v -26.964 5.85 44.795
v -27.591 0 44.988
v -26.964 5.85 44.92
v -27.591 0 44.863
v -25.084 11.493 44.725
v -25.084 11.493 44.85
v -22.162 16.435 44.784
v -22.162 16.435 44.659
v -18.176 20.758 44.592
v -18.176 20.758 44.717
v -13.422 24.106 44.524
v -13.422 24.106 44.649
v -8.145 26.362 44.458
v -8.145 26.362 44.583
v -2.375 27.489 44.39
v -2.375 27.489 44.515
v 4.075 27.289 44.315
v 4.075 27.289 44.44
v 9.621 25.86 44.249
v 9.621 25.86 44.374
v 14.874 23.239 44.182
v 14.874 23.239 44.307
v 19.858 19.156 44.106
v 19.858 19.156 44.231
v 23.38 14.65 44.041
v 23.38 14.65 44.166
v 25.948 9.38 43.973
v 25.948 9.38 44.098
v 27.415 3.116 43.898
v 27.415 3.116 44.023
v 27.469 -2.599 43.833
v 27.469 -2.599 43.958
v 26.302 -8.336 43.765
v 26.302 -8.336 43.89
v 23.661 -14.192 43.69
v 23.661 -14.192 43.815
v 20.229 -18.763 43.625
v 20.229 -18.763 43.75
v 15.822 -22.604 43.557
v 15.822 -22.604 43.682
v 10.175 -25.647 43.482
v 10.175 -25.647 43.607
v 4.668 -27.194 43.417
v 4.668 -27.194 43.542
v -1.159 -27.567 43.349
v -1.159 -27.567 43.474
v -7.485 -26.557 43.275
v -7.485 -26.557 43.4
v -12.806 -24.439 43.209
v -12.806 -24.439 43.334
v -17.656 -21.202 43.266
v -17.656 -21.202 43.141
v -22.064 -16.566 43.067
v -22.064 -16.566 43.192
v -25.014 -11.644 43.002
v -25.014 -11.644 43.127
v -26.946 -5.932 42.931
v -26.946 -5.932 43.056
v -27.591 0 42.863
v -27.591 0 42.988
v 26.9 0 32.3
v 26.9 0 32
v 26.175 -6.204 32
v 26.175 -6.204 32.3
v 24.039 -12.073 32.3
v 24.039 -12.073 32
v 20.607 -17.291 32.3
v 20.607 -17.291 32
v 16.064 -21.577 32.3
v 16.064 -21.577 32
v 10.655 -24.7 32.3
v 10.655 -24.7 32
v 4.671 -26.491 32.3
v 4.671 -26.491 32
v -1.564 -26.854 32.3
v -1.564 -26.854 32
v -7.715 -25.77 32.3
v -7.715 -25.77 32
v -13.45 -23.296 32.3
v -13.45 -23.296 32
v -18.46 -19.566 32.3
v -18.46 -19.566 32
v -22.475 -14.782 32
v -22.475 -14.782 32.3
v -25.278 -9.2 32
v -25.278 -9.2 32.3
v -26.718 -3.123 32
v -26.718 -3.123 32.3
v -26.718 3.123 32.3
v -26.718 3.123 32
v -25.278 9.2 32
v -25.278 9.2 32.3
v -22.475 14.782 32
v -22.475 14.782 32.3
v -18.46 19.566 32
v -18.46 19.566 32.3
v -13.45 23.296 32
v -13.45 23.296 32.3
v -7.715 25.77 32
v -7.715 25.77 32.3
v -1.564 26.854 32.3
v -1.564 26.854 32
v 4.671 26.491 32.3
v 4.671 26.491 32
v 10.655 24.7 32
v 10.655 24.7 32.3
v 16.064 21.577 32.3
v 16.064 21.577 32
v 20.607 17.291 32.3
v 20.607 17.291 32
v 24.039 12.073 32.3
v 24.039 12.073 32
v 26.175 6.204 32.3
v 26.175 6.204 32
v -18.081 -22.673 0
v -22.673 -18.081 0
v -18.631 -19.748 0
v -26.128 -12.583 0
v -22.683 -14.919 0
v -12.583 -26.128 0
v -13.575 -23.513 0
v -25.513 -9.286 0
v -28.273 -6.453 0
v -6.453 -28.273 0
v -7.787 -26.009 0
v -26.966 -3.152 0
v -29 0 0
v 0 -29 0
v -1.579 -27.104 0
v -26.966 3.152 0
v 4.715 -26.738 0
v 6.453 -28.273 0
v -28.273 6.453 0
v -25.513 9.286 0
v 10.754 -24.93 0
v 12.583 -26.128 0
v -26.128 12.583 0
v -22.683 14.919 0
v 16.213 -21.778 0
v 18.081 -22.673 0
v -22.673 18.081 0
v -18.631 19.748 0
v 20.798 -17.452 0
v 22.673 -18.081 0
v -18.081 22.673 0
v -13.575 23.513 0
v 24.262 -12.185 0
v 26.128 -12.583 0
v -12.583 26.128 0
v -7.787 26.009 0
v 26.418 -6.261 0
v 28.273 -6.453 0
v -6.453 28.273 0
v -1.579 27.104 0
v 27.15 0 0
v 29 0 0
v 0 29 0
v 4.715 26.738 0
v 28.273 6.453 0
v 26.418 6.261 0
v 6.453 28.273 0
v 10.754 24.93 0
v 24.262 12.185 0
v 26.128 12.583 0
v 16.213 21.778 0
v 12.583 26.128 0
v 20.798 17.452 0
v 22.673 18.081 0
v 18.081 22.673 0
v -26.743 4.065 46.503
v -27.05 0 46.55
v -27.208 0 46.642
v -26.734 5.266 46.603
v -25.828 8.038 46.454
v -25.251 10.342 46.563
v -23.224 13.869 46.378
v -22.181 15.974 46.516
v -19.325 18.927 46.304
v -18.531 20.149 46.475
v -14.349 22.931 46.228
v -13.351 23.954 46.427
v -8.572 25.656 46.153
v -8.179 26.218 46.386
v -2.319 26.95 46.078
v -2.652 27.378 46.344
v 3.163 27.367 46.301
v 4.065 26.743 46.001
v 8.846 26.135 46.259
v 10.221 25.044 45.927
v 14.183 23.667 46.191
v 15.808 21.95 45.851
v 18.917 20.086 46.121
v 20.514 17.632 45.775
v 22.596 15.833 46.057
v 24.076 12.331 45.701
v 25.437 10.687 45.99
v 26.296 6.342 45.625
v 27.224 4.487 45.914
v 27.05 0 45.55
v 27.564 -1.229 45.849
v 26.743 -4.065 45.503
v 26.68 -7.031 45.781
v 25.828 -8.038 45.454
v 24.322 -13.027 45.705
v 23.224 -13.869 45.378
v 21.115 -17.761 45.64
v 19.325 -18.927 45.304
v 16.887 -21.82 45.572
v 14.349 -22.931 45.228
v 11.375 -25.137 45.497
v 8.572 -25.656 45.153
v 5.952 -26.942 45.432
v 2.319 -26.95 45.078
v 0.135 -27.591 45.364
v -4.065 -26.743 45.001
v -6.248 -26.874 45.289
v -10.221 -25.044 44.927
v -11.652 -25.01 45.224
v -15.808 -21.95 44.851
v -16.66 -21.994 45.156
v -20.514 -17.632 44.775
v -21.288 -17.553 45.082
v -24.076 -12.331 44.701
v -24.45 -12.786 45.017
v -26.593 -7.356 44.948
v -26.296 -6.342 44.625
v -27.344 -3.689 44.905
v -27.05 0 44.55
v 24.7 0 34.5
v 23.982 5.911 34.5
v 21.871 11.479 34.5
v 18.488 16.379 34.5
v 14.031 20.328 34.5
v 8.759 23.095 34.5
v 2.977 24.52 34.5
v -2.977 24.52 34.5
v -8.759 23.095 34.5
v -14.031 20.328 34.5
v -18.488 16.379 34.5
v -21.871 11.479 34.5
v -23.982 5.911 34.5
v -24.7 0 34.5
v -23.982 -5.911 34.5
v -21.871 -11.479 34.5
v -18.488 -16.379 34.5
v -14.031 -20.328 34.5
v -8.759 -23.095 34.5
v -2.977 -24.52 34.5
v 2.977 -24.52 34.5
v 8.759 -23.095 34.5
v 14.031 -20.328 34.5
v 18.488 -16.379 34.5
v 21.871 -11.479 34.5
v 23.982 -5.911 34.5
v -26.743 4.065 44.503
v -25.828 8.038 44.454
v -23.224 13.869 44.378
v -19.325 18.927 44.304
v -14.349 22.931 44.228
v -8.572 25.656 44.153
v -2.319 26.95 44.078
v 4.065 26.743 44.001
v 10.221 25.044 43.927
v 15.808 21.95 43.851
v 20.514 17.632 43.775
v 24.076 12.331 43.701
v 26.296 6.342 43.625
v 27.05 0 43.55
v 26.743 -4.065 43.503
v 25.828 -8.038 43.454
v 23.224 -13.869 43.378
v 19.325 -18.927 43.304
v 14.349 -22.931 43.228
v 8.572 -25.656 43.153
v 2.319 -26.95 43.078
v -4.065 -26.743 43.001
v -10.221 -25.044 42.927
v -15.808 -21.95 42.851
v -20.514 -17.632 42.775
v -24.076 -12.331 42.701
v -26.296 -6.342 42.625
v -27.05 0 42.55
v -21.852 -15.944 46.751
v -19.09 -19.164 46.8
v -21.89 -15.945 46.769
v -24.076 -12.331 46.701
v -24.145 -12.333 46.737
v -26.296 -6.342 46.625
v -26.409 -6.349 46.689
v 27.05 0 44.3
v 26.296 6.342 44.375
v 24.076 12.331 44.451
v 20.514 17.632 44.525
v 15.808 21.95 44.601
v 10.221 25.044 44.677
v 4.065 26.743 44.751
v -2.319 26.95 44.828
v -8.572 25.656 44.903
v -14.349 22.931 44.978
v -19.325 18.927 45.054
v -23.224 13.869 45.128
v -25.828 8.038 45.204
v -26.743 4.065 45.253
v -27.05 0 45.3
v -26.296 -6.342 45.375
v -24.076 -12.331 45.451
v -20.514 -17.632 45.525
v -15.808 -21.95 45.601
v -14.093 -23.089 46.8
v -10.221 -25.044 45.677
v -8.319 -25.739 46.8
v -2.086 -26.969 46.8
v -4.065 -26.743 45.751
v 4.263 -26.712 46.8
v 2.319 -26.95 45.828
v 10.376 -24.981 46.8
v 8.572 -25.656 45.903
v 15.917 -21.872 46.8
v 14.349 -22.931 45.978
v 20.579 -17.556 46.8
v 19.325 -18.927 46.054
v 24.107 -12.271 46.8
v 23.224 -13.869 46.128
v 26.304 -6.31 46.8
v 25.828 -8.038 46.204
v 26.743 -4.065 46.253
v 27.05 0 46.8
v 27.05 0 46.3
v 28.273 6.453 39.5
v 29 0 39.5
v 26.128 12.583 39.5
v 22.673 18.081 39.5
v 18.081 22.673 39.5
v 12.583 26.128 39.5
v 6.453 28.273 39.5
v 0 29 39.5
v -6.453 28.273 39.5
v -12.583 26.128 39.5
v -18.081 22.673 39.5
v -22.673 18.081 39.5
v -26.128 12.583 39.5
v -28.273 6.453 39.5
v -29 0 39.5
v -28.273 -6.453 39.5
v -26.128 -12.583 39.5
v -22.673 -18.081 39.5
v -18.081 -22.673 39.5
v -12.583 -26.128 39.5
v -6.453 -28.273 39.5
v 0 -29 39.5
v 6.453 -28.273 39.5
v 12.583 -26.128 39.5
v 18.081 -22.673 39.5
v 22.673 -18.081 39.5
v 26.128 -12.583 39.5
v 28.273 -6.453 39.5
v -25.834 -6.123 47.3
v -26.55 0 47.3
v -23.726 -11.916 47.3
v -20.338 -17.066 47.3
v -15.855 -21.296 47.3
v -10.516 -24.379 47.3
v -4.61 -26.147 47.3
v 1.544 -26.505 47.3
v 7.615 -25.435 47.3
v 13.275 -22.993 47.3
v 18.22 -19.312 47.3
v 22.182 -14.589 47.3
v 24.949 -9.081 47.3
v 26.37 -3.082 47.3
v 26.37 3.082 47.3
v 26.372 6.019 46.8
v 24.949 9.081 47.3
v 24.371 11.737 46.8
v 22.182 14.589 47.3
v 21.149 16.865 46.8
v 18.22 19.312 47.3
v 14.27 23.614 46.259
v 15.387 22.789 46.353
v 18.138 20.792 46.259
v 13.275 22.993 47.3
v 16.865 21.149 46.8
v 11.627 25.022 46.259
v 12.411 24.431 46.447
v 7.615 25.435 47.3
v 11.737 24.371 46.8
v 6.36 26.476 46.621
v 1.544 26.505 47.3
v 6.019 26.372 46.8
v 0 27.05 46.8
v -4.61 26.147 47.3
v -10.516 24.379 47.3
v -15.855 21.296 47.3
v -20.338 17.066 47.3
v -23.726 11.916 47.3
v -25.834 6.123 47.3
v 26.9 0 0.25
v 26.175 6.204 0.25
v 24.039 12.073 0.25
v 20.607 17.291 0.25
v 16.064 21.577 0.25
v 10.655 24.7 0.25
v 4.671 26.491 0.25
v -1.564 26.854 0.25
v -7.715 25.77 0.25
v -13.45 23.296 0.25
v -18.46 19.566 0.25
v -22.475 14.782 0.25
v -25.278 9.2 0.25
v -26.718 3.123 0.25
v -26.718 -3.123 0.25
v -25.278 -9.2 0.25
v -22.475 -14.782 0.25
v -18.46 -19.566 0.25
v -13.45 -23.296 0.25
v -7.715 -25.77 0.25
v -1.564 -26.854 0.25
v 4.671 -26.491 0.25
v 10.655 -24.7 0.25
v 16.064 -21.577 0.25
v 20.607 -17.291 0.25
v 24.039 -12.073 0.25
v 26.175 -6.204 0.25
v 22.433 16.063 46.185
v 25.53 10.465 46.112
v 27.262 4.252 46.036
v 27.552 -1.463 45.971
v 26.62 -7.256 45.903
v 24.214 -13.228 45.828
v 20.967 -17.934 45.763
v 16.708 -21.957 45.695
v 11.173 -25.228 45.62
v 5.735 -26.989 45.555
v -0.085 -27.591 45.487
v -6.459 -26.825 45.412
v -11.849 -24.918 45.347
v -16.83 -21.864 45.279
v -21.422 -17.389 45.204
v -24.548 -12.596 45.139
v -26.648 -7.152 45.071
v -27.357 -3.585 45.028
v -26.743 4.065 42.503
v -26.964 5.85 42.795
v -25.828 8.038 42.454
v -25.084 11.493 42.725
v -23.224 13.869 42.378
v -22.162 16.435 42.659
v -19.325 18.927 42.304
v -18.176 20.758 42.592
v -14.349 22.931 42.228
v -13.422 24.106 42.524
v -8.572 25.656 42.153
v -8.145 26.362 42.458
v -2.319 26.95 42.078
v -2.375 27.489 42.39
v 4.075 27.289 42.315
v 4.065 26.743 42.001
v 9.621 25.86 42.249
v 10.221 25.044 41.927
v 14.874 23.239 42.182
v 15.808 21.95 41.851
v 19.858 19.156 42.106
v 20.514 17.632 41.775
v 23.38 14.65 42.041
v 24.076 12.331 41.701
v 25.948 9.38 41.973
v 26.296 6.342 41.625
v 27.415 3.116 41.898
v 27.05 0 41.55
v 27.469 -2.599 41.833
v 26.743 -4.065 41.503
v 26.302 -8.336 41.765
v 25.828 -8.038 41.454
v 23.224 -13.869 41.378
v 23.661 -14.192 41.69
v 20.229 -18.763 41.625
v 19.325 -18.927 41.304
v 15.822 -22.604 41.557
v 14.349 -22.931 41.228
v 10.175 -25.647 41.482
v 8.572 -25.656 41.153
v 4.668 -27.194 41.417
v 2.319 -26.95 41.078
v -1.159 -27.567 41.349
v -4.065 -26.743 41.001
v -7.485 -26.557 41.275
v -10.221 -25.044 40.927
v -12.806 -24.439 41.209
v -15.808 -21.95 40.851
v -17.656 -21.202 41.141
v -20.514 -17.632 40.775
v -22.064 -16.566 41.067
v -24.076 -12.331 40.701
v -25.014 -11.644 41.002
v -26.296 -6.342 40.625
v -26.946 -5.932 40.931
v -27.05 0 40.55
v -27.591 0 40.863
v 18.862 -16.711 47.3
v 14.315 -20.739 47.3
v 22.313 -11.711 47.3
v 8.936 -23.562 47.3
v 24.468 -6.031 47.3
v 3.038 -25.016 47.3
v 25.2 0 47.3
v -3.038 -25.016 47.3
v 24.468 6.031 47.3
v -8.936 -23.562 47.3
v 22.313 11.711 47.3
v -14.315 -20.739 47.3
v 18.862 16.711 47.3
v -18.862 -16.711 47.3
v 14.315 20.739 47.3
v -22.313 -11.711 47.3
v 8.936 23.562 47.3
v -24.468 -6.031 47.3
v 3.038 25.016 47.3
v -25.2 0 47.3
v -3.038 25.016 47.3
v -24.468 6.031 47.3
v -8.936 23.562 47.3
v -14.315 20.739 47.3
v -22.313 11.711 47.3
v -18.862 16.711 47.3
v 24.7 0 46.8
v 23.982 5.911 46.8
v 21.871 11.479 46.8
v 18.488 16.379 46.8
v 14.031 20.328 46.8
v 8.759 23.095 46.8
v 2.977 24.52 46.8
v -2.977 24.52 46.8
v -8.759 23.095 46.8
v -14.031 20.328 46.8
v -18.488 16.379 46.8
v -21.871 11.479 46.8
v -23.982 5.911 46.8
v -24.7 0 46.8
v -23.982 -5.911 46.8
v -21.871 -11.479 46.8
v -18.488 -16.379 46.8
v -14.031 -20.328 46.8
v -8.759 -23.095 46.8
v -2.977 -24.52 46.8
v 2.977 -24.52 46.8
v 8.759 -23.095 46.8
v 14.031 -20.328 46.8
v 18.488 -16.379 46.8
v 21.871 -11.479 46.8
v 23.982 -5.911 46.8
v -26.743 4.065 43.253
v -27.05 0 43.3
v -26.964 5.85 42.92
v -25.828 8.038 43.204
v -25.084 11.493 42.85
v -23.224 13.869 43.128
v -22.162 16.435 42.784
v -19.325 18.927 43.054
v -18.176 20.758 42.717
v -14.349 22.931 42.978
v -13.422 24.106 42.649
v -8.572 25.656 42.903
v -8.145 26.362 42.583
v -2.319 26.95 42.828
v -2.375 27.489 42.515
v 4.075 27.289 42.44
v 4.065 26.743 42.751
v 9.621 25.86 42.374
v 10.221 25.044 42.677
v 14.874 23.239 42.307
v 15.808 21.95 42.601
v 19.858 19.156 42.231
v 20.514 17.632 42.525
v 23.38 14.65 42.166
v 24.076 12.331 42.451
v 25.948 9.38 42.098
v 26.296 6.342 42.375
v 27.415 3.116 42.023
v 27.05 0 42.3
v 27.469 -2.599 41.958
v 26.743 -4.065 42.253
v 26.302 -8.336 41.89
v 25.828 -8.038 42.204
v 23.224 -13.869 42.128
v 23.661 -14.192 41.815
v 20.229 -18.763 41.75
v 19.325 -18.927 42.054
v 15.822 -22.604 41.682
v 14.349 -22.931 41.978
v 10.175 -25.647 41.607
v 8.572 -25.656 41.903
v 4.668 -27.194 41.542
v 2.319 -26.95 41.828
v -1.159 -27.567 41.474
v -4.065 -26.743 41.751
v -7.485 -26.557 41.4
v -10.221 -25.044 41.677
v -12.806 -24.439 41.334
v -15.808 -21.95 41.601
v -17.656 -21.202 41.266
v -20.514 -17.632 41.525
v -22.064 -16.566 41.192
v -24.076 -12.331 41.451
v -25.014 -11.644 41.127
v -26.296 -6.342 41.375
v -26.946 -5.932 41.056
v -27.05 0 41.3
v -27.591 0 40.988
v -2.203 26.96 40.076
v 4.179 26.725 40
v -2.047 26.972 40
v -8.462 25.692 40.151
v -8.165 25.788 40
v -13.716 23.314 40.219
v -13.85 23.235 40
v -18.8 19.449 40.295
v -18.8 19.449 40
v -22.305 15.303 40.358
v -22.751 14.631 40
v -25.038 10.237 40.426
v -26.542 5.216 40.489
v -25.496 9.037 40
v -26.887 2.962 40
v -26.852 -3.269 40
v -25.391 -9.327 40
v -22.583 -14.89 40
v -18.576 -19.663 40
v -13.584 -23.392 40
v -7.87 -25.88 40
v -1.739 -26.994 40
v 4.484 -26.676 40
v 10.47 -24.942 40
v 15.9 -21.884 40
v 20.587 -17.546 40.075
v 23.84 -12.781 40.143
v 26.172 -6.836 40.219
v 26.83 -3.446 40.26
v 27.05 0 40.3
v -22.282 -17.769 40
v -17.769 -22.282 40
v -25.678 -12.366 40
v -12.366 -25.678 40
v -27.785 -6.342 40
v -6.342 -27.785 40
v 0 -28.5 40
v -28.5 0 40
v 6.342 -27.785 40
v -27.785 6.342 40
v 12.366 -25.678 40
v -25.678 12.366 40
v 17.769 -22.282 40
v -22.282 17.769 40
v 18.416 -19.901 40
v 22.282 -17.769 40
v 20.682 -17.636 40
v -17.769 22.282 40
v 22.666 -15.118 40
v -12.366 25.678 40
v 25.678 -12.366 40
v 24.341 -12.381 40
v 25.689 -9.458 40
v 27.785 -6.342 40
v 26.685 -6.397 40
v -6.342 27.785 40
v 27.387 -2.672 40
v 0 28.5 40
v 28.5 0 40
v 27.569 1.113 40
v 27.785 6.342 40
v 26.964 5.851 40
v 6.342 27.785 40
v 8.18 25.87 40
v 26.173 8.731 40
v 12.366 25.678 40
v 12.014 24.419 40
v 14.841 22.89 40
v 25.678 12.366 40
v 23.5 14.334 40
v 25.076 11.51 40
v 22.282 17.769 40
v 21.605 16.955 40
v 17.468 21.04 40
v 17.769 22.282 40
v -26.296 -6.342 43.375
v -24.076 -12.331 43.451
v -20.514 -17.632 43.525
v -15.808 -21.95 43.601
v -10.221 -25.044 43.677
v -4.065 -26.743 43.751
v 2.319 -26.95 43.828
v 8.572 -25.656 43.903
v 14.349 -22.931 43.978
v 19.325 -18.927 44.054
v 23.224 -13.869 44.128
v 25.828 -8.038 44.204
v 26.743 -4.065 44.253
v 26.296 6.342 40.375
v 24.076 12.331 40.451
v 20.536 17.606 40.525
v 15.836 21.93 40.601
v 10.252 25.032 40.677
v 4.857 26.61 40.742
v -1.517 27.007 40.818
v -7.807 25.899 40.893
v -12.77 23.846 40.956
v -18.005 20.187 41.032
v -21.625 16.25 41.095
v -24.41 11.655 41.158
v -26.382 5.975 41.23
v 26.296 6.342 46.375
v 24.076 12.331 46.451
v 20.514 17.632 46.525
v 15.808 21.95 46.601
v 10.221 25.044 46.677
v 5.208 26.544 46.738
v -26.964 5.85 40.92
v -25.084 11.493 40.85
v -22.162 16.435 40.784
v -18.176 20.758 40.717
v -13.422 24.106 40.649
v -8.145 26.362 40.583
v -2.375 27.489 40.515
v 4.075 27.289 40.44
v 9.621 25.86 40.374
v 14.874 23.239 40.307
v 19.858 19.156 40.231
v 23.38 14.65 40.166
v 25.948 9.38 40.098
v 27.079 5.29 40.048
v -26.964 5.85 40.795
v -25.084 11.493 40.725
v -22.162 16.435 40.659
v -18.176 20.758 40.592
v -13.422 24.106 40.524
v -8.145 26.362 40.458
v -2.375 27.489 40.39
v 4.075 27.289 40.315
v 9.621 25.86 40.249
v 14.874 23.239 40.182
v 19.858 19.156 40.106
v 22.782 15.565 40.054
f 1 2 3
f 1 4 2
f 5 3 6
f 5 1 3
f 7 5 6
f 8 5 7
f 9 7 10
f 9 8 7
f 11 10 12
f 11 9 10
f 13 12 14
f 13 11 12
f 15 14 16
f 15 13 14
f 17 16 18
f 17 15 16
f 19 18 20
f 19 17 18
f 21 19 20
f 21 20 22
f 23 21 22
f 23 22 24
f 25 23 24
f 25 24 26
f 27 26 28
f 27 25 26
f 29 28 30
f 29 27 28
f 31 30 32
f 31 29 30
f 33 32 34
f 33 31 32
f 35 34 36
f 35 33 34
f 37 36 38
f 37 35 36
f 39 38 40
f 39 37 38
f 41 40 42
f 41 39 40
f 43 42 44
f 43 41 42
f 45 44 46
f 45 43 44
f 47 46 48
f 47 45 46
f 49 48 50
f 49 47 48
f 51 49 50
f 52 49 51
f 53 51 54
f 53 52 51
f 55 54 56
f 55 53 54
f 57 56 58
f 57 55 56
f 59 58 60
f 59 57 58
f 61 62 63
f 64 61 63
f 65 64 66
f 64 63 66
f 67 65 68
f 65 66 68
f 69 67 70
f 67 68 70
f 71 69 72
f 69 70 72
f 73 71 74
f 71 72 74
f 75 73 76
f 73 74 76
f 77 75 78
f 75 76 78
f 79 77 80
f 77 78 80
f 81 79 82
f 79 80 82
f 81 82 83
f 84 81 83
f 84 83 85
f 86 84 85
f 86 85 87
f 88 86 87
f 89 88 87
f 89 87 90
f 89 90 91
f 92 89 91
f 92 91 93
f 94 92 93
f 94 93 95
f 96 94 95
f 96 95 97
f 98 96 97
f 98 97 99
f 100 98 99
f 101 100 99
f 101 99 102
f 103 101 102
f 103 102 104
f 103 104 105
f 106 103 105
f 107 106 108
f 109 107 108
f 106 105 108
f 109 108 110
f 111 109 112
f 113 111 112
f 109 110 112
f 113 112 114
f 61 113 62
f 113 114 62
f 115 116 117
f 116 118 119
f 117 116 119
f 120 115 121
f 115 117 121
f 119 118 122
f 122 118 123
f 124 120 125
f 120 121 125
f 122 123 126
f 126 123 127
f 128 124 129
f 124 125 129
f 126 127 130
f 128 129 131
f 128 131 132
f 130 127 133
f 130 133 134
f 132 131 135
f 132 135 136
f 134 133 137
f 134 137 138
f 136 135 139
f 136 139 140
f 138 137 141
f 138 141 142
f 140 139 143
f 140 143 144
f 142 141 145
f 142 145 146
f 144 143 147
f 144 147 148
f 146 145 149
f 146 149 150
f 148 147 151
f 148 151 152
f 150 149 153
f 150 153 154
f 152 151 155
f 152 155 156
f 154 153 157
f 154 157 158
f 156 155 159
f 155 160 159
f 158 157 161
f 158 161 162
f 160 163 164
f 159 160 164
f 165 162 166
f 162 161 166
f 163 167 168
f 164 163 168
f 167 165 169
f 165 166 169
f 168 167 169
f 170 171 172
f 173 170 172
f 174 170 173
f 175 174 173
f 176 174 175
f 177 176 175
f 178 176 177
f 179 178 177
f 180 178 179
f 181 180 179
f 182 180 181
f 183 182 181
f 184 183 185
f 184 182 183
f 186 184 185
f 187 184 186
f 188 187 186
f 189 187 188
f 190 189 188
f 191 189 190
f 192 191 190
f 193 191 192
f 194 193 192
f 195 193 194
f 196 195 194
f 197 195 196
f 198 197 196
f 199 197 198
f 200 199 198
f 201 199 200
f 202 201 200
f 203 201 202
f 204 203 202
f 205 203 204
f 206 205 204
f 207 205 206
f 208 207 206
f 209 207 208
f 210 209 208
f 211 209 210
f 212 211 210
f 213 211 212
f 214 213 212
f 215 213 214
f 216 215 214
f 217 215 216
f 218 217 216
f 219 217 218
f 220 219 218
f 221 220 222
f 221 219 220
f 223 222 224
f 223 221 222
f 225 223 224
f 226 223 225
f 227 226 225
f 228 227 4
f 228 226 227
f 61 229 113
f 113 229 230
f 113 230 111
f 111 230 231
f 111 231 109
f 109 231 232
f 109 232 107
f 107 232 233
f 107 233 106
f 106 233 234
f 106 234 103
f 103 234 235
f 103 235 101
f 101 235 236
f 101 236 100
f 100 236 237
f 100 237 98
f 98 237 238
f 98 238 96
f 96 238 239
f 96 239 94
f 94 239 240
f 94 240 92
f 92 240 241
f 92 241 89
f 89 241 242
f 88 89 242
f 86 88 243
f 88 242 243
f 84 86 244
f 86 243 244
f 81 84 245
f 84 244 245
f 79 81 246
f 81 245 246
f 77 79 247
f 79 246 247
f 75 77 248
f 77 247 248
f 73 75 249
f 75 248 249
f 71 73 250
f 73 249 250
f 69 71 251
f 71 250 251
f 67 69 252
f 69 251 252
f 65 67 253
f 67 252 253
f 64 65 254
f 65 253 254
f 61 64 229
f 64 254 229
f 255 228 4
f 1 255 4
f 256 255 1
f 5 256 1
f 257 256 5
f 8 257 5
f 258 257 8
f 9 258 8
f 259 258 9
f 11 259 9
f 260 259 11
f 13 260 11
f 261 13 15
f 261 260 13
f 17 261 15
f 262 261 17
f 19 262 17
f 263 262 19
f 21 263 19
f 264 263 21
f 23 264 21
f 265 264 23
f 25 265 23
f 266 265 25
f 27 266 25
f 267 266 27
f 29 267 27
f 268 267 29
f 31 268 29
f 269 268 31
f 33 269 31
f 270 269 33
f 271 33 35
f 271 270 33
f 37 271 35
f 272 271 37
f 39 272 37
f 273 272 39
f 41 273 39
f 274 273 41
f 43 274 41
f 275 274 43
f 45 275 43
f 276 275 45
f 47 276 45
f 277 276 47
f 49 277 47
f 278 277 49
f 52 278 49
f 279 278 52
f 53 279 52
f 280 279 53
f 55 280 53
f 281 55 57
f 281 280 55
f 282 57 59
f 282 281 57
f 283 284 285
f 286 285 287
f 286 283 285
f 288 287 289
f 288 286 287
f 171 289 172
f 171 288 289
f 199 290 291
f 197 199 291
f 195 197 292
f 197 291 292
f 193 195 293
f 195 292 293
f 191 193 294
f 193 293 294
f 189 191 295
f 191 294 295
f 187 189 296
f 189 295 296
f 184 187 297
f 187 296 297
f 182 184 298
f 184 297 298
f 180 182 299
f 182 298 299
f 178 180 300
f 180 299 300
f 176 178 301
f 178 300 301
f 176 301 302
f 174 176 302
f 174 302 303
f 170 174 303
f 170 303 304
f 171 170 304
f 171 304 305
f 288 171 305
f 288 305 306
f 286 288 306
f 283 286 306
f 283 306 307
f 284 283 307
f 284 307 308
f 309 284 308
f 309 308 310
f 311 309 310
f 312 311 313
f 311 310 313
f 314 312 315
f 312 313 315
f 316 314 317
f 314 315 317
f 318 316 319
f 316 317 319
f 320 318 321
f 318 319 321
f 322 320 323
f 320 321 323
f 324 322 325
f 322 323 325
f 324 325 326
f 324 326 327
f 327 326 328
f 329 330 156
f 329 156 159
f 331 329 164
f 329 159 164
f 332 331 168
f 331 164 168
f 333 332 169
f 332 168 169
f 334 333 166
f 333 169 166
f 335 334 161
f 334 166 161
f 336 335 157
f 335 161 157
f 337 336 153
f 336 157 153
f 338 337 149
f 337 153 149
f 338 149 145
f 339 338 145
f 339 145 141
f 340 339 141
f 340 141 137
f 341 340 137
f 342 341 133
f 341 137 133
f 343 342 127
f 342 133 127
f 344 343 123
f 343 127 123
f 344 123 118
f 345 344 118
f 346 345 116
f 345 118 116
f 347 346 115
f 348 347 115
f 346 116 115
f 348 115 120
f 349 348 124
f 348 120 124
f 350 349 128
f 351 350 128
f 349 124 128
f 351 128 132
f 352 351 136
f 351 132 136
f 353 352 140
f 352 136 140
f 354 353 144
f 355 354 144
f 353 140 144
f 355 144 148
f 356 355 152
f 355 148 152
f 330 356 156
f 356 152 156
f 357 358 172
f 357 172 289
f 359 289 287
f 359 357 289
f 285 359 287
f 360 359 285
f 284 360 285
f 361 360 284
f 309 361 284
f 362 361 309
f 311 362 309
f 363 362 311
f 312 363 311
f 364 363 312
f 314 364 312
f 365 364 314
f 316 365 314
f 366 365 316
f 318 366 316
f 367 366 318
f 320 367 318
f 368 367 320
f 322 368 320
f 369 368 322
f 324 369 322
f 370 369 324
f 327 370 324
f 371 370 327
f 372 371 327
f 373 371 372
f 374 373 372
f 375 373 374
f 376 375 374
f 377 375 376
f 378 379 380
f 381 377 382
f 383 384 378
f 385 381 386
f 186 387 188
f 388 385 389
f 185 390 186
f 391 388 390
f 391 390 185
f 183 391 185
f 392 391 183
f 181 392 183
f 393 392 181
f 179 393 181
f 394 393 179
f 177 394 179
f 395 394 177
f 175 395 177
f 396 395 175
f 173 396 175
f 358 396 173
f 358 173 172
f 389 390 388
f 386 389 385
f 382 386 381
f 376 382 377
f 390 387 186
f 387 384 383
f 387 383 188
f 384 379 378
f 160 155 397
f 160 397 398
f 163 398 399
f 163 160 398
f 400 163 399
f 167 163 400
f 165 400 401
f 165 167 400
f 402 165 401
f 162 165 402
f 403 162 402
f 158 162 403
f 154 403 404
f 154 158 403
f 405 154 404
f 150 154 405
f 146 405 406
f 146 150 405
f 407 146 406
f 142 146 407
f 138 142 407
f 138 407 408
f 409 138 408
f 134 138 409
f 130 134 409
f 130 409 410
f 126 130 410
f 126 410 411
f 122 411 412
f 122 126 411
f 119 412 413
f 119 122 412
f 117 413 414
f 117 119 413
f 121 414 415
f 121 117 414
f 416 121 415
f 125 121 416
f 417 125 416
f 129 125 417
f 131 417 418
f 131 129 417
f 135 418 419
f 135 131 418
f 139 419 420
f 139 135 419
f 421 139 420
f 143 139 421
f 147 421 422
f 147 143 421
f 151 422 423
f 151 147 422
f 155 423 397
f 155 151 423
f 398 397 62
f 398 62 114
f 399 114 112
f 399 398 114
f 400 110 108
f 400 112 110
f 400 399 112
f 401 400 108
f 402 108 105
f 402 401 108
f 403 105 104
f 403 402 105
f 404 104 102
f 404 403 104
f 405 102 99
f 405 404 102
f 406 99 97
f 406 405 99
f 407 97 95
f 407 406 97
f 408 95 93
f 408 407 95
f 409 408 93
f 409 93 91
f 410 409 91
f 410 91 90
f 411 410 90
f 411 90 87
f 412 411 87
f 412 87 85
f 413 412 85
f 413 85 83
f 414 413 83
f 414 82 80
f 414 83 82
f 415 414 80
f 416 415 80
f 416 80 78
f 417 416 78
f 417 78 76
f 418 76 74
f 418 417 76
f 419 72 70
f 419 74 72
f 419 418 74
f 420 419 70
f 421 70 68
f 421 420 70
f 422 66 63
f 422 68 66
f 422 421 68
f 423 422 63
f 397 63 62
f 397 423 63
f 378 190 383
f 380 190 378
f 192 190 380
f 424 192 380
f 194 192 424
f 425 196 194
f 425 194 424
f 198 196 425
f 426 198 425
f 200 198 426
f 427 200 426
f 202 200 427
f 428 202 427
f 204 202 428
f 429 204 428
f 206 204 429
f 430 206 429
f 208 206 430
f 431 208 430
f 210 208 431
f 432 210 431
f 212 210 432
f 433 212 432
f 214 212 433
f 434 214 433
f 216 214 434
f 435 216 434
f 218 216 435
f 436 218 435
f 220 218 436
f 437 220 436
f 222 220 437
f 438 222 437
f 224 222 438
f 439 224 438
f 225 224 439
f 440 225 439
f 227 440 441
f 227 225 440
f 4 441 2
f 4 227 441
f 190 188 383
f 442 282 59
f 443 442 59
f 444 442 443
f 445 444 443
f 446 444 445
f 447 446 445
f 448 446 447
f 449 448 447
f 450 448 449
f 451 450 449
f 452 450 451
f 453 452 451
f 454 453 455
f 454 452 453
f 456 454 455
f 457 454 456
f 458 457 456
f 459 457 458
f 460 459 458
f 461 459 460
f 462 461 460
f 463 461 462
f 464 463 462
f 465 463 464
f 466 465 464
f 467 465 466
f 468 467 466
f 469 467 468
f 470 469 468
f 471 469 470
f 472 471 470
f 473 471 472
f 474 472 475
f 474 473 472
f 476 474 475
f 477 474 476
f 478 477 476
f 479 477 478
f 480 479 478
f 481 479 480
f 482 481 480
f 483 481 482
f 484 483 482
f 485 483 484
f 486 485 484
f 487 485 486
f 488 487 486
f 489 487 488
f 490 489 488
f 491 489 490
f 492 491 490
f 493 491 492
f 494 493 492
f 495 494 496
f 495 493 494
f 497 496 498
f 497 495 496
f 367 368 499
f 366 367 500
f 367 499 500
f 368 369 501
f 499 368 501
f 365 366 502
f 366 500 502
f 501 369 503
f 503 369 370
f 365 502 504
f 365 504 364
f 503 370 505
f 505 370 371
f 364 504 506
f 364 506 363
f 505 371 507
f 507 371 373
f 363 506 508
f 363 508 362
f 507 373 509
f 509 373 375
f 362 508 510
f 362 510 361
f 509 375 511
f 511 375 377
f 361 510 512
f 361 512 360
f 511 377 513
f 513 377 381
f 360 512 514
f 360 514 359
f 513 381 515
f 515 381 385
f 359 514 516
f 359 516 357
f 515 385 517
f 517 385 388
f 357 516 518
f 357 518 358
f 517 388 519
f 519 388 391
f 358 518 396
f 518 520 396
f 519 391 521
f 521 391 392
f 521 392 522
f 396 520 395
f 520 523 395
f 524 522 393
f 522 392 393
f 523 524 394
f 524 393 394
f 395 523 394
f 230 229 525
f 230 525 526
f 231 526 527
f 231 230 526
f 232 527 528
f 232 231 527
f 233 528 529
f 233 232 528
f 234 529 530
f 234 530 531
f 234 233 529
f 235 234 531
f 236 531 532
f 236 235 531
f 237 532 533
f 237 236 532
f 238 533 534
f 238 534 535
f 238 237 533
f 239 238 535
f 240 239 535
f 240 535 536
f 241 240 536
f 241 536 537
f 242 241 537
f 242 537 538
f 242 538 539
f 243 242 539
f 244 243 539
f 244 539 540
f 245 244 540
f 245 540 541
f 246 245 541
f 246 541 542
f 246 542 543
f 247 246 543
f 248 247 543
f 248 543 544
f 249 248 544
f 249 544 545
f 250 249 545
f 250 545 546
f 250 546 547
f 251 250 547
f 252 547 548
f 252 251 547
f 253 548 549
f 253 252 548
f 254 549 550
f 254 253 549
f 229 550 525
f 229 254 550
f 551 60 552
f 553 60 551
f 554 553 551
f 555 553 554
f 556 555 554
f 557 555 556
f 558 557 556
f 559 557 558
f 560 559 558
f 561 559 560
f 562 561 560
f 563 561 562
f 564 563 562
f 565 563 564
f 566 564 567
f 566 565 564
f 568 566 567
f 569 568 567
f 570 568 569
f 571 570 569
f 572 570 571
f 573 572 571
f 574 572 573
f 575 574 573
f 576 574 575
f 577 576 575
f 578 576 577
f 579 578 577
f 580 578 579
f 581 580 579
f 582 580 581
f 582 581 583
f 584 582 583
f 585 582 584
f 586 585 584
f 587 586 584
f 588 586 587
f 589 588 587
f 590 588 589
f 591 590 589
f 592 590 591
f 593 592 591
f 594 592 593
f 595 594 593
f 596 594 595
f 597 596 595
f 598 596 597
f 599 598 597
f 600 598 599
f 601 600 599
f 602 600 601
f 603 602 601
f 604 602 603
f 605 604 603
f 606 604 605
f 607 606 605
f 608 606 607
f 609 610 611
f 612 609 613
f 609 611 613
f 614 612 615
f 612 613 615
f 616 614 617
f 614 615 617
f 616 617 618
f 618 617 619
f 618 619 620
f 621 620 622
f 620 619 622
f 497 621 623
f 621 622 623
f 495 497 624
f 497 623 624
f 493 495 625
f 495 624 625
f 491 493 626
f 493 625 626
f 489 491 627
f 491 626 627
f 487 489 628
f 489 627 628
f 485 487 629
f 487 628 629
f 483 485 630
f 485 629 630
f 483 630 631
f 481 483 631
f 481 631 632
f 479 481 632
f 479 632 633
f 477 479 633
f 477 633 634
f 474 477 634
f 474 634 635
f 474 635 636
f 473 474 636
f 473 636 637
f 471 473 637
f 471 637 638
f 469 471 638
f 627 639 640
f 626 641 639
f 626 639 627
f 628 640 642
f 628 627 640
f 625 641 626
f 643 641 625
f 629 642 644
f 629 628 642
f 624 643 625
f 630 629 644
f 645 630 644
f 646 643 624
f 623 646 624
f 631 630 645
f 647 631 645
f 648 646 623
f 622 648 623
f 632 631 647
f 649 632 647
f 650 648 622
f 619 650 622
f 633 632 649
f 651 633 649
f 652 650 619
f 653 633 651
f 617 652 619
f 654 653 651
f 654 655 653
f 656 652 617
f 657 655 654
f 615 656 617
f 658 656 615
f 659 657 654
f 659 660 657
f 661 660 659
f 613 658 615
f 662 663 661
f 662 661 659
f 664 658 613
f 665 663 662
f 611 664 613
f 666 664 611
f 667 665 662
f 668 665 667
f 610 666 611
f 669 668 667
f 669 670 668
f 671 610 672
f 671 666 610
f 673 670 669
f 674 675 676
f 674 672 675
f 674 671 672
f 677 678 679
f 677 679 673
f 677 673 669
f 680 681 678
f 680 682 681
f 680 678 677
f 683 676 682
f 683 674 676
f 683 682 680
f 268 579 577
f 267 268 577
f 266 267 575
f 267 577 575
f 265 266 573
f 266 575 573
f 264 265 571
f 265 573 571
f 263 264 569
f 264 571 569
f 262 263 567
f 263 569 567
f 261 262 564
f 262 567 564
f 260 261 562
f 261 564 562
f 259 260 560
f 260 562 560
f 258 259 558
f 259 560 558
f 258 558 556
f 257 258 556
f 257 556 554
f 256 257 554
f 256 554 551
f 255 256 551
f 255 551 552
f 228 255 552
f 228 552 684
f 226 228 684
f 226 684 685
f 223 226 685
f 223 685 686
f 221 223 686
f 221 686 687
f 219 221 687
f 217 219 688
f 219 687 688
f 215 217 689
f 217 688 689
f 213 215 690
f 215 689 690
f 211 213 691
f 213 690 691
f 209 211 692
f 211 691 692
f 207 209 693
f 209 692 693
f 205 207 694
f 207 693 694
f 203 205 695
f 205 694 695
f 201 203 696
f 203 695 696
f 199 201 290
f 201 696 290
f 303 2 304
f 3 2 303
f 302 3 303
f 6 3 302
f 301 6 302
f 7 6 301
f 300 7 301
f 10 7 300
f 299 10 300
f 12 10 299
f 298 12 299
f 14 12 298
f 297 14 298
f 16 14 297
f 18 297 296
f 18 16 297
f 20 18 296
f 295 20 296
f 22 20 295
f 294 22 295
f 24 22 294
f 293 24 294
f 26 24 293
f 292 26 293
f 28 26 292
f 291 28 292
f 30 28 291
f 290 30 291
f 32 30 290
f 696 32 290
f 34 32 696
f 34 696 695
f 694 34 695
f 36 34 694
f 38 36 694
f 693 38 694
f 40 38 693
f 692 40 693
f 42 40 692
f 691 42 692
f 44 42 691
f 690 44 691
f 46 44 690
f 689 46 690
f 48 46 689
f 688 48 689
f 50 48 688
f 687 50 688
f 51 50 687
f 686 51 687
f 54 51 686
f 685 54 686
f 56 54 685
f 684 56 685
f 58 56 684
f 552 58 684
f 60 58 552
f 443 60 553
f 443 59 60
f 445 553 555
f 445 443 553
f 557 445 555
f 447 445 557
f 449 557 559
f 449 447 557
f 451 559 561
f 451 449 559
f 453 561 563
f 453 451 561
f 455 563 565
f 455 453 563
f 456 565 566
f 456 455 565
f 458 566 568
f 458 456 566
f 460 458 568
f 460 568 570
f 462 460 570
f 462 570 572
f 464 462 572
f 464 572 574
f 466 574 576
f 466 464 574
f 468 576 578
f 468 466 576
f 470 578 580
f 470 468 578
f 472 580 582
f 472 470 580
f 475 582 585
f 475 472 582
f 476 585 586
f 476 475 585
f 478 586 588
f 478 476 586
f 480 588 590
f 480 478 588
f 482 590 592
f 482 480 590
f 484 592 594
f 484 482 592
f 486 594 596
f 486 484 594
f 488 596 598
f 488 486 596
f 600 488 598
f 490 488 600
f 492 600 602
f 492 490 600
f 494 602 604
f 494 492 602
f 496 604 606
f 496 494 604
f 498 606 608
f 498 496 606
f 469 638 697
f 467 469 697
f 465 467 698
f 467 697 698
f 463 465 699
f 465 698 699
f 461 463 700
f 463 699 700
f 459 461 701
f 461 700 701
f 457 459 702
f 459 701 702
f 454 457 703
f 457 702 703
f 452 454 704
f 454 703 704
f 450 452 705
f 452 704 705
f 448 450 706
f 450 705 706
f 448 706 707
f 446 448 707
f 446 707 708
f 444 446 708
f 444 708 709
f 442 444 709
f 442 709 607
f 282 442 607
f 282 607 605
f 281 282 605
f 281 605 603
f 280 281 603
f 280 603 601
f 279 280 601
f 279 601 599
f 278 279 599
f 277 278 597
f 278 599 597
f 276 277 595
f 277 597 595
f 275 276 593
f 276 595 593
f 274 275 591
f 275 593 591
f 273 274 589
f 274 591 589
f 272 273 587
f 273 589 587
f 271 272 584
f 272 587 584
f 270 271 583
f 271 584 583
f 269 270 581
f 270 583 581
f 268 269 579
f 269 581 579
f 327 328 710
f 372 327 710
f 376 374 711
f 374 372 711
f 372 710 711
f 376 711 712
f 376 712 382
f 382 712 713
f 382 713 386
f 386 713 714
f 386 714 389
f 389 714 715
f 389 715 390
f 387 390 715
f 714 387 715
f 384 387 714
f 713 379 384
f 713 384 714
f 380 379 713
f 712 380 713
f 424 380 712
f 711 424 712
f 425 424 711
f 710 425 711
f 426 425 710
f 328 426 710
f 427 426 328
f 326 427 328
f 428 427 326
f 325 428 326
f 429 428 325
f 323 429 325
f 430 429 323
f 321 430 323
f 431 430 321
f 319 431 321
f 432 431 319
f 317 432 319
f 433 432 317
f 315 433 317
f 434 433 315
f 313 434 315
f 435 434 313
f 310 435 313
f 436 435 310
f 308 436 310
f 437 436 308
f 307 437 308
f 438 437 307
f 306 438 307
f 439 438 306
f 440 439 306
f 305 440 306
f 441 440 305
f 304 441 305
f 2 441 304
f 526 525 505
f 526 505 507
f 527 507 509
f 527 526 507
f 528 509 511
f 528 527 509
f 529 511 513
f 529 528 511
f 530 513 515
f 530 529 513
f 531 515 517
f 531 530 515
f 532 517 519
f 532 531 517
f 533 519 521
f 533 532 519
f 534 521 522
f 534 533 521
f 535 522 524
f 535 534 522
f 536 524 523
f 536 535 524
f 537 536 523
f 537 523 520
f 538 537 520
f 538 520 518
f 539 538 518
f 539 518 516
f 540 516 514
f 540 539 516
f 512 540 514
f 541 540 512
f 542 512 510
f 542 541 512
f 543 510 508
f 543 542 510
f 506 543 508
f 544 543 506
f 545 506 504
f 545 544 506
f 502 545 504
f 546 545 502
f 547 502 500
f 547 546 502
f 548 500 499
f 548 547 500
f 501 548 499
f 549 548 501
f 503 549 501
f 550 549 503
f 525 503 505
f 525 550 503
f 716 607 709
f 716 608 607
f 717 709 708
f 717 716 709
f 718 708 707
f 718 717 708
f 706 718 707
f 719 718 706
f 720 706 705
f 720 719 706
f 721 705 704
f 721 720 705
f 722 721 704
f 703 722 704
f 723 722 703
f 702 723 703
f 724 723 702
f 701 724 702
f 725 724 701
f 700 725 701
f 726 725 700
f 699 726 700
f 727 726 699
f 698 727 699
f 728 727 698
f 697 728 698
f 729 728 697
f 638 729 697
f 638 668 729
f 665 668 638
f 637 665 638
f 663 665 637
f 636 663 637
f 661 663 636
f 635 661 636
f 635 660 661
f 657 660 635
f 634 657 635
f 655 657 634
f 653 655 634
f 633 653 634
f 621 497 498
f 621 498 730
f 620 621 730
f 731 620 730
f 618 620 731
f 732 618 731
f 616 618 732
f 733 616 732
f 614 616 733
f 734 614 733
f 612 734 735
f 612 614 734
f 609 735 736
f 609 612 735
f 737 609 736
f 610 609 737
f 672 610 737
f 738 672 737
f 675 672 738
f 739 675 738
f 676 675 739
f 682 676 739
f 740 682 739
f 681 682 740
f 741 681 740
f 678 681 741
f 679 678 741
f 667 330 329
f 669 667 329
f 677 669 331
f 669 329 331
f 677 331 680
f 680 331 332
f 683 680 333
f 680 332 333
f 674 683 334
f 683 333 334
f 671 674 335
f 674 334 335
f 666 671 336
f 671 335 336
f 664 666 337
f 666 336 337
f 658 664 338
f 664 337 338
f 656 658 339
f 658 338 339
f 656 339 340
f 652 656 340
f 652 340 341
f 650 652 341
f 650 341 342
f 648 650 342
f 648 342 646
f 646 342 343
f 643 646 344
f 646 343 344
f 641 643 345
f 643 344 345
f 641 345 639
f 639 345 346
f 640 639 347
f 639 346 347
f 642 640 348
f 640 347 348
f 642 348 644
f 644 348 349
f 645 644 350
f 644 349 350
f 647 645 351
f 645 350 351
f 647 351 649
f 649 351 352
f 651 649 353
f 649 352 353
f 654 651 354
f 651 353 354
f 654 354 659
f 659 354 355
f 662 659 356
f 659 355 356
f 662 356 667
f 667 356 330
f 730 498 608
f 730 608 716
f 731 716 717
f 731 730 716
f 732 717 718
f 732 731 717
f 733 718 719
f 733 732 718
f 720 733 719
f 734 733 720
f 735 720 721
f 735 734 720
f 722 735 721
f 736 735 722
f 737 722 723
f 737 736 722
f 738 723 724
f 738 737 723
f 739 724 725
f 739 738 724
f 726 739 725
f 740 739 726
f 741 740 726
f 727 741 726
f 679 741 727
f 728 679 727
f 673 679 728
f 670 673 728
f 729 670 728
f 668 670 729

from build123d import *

# Parameters (mm, degrees)
SKETCH1_R           = 29
SKETCH1_R_2         = 26.9
EXTRUDE1_DEPTH      = 40
EXTRUDE2_DEPTH      = 7.3
EXTRUDE2_DEPTH_BACK = 8
SKETCH2_R           = 27.05
SKETCH2_R_2         = 24.7
THREAD1_PITCH       = 2
THREAD1_FROM        = 2
CHAMFER1_SIZE       = 0.5
CHAMFER2_SIZE       = 2.5
CHAMFER4_SIZE       = 0.25


with BuildPart() as part:
    # Sketch1 → Extrude1 (new body)
    with BuildSketch(Plane.XY):
        Circle(SKETCH1_R)
        Circle(SKETCH1_R_2, mode=Mode.SUBTRACT)
    extrude(amount=EXTRUDE1_DEPTH)

    # Sketch2 → Extrude2 (add, two sides: drawn at the far end of the back side and taken through both)
    with BuildSketch(Plane.XY.offset(40).offset(-EXTRUDE2_DEPTH_BACK)):
        Circle(SKETCH2_R)
        Circle(SKETCH2_R_2, mode=Mode.SUBTRACT)
    extrude(amount=EXTRUDE2_DEPTH + EXTRUDE2_DEPTH_BACK)

    # Thread1: arcs per turn and ends read off the stored shape
    # Thread1: the profile of Sketch4 profile screwed along a right-hand helix through 4.65 turns, 10 arcs to a turn; built about Z, then put on its axis
    thread1_z = Axis((0, 0, 0), (0, 0, 1))
    thread1_corners = [(27.0497, 0, -0.000173205), (27.591265875, 0, 0.312499999), (27.591265875, 0, 0.437499999), (27.0497, 0, 0.750173202)]
    with BuildLine(mode=Mode.PRIVATE) as thread1_profile:
        Line(thread1_corners[0], thread1_corners[1])
        Line(thread1_corners[1], thread1_corners[2])
        Line(thread1_corners[2], thread1_corners[3])
        Line(thread1_corners[3], thread1_corners[0])
    thread1_cap = Face(thread1_profile.wire())
    thread1_turn_angles = [0, 18, 36, 54, 72, 90, 108, 126, 144, 162, 180, 198, 216, 234, 252, 270, 288, 306, 324, 342, 360]
    thread1_turn_weights = [1, 0.9510565162951535, 1, 0.9510565162951535, 1, 0.9510565162951535, 1, 0.9510565162951535, 1, 0.9510565162951535, 1, 0.9510565162951535, 1, 0.9510565162951535, 1, 0.9510565162951535, 1, 0.9510565162951535, 1, 0.9510565162951535, 1]
    thread1_turn_rails = [Edge.make_bspline([Vector(p[0], p[1], 0).rotate(thread1_z, thread1_turn_angles[k]) / thread1_turn_weights[k] + Vector(0, 0, p[2] + THREAD1_PITCH * thread1_turn_angles[k] / 360) for k in range(21)], [0, 0, 0, 1, 1, 2, 2, 3, 3, 4, 4, 5, 5, 6, 6, 7, 7, 8, 8, 9, 9, 10, 10, 10], 2, thread1_turn_weights) for p in thread1_corners]
    thread1_turn_sides = [Face.make_surface_from_curves(thread1_turn_rails[p[0]], thread1_turn_rails[p[1]]) for p in [(0, 1), (1, 2), (2, 3), (3, 0)]]
    thread1_last_angles = [1440, 1458, 1476, 1494, 1512, 1530, 1548, 1566, 1584, 1602, 1620, 1638, 1656, 1665, 1674]
    thread1_last_weights = [1, 0.9510565162951535, 1, 0.9510565162951535, 1, 0.9510565162951535, 1, 0.9510565162951535, 1, 0.9510565162951535, 1, 0.9510565162951535, 1, 0.9876883405951371, 1]
    thread1_last_rails = [Edge.make_bspline([Vector(p[0], p[1], 0).rotate(thread1_z, thread1_last_angles[k]) / thread1_last_weights[k] + Vector(0, 0, p[2] + THREAD1_PITCH * thread1_last_angles[k] / 360) for k in range(15)], [0, 0, 0, 1, 1, 2, 2, 3, 3, 4, 4, 5, 5, 6, 6, 7, 7, 7], 2, thread1_last_weights) for p in thread1_corners]
    thread1_last_sides = [Face.make_surface_from_curves(thread1_last_rails[p[0]], thread1_last_rails[p[1]]) for p in [(0, 1), (1, 2), (2, 3), (3, 0)]]
    thread1 = Plane(origin=(0, 0, 49.3), x_dir=(-1, 0, 0), z_dir=(0, 0, -1)) * split(Solid(Shell([*[p.moved(Location((0, 0, THREAD1_PITCH * i))) for i in range(4) for p in thread1_turn_sides], *thread1_last_sides, thread1_cap, thread1_cap.rotate(thread1_z, 1674).moved(Location((0, 0, THREAD1_PITCH * 1674 / 360)))])), bisect_by=Plane.XY.offset(THREAD1_FROM), keep=Keep.TOP, mode=Mode.PRIVATE)
    add(thread1)

    # Chamfer1
    chamfer1_edges = [part.edges().sort_by_distance(p)[0] for p in [
        (-24.7, 0, 47.3),
        (-29, 0, 40),
    ]]
    chamfer(chamfer1_edges, length=CHAMFER1_SIZE)

    # Chamfer2
    # the kernel refuses this chamfer: 2.5 mm, written as the material it takes off along each edge
    with BuildSketch(Plane(origin=(0, 0, 32), x_dir=(1, 0, 0), z_dir=(0, -1, 0))) as chamfer2_piece_1_section:
        Polygon((24.7 + CHAMFER2_SIZE, 0), (24.7, CHAMFER2_SIZE), (24.7, 0), align=None)
    chamfer2_piece_1 = revolve(axis=Axis((0, 0, 32), (0, 0, 1)), mode=Mode.PRIVATE)
    chamfer2_piece_1 = chamfer2_piece_1 & Plane(origin=(0, 0, 32), x_dir=(1, 0, 0), z_dir=(0, 0, -1)) * Cylinder(26.9, 109, mode=Mode.PRIVATE)
    add(chamfer2_piece_1, mode=Mode.SUBTRACT)

    # Sketch7 → Cut-Revolve1 (revolve, cut)
    with BuildSketch(Plane(origin=(0, 0, 0), x_dir=(1, 0, 0), z_dir=(0, 1, 0))):
        Polygon((-28.009015865, -45.840984135), (-26.55, -47.3), (-27.05, -47.3), (-28.680601357, -47.3), (-28.680601357, -45.840984135), align=None)
    revolve(axis=Axis((0, 0, 0), (0, 0, 1)), mode=Mode.SUBTRACT)

    # Chamfer4
    chamfer4_edges = [part.edges().sort_by_distance(p)[0] for p in [
        (-26.9, 0, 0),
    ]]
    chamfer(chamfer4_edges, length=CHAMFER4_SIZE)


solid = part.part
